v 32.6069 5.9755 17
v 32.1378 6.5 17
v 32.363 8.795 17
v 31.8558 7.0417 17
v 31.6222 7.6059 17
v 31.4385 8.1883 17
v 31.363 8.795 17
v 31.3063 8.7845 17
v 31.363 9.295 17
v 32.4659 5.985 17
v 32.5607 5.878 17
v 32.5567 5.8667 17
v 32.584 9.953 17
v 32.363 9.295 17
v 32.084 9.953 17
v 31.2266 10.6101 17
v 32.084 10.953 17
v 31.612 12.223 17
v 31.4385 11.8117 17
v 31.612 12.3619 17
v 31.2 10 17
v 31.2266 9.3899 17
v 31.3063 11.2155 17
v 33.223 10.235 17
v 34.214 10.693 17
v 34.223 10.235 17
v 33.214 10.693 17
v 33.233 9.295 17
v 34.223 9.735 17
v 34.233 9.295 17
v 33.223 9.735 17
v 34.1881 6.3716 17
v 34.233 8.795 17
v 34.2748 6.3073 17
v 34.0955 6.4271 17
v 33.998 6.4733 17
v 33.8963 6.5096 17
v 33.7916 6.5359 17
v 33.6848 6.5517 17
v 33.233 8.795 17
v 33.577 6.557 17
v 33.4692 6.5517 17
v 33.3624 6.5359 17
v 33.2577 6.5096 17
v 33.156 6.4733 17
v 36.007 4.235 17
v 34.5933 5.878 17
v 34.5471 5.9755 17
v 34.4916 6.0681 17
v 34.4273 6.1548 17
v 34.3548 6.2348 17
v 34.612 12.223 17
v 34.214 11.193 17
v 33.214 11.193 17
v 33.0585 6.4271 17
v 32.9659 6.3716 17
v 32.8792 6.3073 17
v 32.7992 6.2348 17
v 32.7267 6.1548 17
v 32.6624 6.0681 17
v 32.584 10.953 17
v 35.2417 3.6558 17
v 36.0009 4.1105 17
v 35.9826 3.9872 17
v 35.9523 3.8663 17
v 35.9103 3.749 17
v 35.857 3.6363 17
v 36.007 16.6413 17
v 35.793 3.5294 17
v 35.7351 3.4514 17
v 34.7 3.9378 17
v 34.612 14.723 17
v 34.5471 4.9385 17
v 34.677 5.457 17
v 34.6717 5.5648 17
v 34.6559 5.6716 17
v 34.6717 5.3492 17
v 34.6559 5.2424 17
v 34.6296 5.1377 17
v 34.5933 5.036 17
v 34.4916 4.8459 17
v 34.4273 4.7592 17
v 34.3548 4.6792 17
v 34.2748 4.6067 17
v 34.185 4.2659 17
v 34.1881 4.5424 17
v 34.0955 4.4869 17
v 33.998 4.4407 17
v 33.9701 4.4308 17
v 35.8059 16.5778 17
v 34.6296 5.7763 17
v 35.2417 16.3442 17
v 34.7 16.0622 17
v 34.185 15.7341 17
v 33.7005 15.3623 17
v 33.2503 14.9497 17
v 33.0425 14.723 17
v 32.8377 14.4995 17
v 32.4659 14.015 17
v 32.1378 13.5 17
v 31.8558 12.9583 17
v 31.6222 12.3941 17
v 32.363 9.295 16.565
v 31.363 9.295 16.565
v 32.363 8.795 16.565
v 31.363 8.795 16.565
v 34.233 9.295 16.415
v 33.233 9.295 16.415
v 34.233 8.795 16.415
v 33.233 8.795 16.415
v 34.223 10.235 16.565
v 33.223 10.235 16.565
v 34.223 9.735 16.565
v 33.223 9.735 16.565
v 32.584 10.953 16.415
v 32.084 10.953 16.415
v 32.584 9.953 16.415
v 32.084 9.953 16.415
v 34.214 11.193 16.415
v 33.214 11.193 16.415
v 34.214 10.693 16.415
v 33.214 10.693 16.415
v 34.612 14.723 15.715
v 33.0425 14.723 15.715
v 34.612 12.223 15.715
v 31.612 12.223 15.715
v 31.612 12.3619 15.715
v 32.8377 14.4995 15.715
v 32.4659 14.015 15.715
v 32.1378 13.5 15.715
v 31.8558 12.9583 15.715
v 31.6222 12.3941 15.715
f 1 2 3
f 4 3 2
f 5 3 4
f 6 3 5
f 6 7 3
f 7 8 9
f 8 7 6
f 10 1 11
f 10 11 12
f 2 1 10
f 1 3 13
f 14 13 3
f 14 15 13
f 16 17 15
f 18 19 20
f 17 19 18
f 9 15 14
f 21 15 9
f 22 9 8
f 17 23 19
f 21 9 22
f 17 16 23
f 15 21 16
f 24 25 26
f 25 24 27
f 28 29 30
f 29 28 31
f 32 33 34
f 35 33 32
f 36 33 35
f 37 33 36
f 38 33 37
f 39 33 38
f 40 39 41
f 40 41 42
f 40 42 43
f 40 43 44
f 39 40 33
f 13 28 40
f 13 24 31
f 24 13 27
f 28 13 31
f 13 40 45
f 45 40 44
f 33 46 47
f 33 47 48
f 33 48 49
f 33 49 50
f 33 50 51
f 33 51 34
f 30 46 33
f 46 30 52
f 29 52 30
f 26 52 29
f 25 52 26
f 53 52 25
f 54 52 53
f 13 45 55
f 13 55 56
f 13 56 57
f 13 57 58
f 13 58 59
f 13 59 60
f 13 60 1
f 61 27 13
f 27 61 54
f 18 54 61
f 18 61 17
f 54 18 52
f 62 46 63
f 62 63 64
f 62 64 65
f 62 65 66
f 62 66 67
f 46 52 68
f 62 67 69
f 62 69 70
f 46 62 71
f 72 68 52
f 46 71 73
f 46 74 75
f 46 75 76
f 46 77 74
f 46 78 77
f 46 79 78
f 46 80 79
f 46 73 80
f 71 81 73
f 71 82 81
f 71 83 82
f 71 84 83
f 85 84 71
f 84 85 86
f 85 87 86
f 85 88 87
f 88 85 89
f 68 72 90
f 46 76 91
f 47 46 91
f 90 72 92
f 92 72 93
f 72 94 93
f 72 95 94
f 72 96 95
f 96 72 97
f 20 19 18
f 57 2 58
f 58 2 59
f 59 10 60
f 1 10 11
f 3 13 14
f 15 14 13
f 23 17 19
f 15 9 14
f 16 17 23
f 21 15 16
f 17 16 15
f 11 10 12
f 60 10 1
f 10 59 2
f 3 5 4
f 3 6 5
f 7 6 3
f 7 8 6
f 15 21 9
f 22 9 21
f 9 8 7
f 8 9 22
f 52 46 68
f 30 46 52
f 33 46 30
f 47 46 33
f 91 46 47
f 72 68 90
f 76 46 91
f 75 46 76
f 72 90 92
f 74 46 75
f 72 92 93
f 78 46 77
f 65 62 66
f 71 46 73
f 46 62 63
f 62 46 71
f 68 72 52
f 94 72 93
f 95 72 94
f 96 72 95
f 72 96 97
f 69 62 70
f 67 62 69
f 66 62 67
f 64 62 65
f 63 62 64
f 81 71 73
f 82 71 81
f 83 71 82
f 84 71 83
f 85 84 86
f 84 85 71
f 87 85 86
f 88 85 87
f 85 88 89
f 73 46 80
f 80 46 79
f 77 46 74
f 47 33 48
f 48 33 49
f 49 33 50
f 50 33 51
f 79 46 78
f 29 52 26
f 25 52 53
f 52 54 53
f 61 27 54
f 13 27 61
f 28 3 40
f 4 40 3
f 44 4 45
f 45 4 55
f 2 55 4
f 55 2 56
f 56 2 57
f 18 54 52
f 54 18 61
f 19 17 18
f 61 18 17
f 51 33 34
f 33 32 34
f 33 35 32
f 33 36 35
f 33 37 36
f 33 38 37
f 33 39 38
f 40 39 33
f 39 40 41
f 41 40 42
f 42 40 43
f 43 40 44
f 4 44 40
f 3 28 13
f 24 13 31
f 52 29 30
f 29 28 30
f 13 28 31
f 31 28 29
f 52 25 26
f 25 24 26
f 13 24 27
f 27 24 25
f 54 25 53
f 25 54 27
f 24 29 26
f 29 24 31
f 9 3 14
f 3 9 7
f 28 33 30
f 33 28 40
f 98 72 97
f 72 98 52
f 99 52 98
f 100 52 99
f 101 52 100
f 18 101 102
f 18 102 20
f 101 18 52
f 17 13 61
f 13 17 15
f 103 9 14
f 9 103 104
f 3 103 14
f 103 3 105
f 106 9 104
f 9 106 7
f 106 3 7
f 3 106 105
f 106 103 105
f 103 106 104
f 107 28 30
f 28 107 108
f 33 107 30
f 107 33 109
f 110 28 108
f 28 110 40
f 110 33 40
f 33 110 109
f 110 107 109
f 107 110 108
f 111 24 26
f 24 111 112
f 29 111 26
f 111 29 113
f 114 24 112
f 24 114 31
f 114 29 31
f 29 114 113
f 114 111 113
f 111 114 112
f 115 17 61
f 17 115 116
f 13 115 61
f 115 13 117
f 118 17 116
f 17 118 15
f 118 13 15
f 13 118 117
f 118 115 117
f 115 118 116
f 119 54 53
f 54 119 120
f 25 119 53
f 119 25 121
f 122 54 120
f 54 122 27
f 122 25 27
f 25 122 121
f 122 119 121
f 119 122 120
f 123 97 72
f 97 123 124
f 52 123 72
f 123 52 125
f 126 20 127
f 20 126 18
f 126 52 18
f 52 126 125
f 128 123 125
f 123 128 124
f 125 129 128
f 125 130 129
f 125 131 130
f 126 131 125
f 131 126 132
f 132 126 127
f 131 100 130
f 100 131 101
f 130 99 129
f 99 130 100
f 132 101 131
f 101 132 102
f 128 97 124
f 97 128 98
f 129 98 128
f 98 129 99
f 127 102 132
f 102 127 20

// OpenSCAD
include <_v6_gear.scad>
part = "probe";
// 読み取りの芯まわり φ12 の柱で ReSpeaker を切り、Z 17.0 より下に何が垂れているかを見る
intersection() { rs_solid(); translate([SENS[0], SENS[1], 0]) cylinder(d = 14, h = 17.0); }
